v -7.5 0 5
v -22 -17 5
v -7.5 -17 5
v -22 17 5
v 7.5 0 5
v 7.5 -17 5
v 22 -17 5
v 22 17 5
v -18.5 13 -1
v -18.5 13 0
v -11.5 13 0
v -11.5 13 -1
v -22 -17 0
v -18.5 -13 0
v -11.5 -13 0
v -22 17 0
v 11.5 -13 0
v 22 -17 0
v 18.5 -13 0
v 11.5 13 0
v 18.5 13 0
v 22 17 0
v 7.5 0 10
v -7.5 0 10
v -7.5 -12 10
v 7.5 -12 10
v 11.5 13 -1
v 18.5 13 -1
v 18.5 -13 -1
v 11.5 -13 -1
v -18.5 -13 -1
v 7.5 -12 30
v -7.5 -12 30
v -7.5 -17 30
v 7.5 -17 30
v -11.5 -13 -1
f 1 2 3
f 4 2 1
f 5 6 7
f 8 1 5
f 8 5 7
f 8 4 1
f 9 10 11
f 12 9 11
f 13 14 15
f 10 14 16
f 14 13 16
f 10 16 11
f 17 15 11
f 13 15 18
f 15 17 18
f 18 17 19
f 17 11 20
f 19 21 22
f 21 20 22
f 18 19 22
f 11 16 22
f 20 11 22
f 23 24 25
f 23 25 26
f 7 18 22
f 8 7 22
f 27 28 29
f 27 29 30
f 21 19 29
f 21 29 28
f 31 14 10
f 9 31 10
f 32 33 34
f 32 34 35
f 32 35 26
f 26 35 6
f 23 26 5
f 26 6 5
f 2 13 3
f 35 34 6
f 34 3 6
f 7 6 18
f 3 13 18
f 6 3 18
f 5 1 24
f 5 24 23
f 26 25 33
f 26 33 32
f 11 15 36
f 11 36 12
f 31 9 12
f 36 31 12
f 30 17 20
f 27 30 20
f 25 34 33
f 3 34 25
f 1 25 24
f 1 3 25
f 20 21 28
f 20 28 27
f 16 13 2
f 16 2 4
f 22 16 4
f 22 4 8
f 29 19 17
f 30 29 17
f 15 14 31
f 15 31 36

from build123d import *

# Parameters (mm, degrees)
SKETCH_1_W      = 44
SKETCH_1_H      = 34
EXTRUDE_1_DEPTH = 5
SKETCH_2_W      = 7
SKETCH_2_H      = 26
EXTRUDE_2_DEPTH = 1
SKETCH_3_W      = 15
SKETCH_3_H      = 17
EXTRUDE_3_DEPTH = 5
SKETCH_4_W      = 15
SKETCH_4_H      = 5
EXTRUDE_4_DEPTH = 20


with BuildPart() as part:
    # 스케치1 → 보스-돌출1 (new body)
    with BuildSketch(Plane.XY):
        Rectangle(SKETCH_1_W, SKETCH_1_H)
    extrude(amount=EXTRUDE_1_DEPTH)

    # 스케치2 → 보스-돌출2 (add)
    with BuildSketch(Plane(origin=(0, 0, 0), x_dir=(-1, 0, 0), z_dir=(0, 0, -1))):
        with Locations((-15, 0)):
            Rectangle(SKETCH_2_W, SKETCH_2_H)
    extrude_2 = extrude(amount=EXTRUDE_2_DEPTH)

    # 대칭 복사1: 보스-돌출2 across plane
    add(extrude_2.mirror(Plane(origin=(0, 0, 0), x_dir=(0, 0, 1), z_dir=(1, 0, 0))))

    # 스케치3 → 보스-돌출3 (add)
    with BuildSketch(Plane.XY.offset(5)):
        with Locations((0, -8.5)):
            Rectangle(SKETCH_3_W, SKETCH_3_H)
    extrude(amount=EXTRUDE_3_DEPTH)

    # 스케치4 → 보스-돌출4 (add)
    with BuildSketch(Plane.XY.offset(10)):
        with Locations((0, -14.5)):
            Rectangle(SKETCH_4_W, SKETCH_4_H)
    extrude(amount=EXTRUDE_4_DEPTH)


solid = part.part
